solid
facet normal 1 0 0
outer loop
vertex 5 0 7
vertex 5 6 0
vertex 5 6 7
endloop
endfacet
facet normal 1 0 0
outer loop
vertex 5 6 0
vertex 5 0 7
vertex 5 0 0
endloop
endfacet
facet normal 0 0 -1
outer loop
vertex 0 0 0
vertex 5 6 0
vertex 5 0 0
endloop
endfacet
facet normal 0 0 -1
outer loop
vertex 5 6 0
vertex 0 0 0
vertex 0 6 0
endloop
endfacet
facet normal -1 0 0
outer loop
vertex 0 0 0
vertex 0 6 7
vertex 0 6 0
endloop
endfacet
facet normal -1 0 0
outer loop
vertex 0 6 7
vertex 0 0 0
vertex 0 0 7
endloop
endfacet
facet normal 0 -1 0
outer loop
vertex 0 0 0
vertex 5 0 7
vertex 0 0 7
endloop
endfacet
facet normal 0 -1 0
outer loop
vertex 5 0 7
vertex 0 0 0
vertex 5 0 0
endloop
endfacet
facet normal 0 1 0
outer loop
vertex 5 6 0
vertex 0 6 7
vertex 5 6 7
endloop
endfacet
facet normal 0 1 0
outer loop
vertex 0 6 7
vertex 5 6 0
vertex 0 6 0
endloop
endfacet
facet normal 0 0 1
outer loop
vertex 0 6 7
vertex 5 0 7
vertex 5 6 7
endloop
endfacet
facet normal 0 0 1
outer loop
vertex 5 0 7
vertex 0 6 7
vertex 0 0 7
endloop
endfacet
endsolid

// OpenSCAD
translate([2.5, 1.5, 1.0]) color([0.2786145977098805, 0.4423646135017597, 0.5682329433322765]) cube([5, 3, 2], center=true);
translate([2.5, 4.5, 1.0]) color([0.13781274972163116, 0.1232982180791492, 0.12051785276403837]) cube([5, 3, 2], center=true);
translate([2.5, 1.5, 3.0]) color([0.4012165411640888, 0.4679428423906348, 0.5596131508667647]) cube([5, 3, 2], center=true);
translate([2.5, 4.5, 3.0]) color([0.29896126951320356, 0.6321114709426877, 0.7423454703026071]) cube([5, 3, 2], center=true);
translate([2.5, 1.0, 5.5]) color([0.21800995973285464, 0.48885816108208613, 0.501567157493831]) cube([5, 2, 3], center=true);
translate([2.5, 3.0, 5.5]) color([0.49271975198428686, 0.958422556968198, 0.44398175403613704]) cube([5, 2, 3], center=true);
translate([2.5, 5.0, 5.5]) color([0.14281143058247625, 0.4955231327742775, 0.8873352305676206]) cube([5, 2, 3], center=true);
